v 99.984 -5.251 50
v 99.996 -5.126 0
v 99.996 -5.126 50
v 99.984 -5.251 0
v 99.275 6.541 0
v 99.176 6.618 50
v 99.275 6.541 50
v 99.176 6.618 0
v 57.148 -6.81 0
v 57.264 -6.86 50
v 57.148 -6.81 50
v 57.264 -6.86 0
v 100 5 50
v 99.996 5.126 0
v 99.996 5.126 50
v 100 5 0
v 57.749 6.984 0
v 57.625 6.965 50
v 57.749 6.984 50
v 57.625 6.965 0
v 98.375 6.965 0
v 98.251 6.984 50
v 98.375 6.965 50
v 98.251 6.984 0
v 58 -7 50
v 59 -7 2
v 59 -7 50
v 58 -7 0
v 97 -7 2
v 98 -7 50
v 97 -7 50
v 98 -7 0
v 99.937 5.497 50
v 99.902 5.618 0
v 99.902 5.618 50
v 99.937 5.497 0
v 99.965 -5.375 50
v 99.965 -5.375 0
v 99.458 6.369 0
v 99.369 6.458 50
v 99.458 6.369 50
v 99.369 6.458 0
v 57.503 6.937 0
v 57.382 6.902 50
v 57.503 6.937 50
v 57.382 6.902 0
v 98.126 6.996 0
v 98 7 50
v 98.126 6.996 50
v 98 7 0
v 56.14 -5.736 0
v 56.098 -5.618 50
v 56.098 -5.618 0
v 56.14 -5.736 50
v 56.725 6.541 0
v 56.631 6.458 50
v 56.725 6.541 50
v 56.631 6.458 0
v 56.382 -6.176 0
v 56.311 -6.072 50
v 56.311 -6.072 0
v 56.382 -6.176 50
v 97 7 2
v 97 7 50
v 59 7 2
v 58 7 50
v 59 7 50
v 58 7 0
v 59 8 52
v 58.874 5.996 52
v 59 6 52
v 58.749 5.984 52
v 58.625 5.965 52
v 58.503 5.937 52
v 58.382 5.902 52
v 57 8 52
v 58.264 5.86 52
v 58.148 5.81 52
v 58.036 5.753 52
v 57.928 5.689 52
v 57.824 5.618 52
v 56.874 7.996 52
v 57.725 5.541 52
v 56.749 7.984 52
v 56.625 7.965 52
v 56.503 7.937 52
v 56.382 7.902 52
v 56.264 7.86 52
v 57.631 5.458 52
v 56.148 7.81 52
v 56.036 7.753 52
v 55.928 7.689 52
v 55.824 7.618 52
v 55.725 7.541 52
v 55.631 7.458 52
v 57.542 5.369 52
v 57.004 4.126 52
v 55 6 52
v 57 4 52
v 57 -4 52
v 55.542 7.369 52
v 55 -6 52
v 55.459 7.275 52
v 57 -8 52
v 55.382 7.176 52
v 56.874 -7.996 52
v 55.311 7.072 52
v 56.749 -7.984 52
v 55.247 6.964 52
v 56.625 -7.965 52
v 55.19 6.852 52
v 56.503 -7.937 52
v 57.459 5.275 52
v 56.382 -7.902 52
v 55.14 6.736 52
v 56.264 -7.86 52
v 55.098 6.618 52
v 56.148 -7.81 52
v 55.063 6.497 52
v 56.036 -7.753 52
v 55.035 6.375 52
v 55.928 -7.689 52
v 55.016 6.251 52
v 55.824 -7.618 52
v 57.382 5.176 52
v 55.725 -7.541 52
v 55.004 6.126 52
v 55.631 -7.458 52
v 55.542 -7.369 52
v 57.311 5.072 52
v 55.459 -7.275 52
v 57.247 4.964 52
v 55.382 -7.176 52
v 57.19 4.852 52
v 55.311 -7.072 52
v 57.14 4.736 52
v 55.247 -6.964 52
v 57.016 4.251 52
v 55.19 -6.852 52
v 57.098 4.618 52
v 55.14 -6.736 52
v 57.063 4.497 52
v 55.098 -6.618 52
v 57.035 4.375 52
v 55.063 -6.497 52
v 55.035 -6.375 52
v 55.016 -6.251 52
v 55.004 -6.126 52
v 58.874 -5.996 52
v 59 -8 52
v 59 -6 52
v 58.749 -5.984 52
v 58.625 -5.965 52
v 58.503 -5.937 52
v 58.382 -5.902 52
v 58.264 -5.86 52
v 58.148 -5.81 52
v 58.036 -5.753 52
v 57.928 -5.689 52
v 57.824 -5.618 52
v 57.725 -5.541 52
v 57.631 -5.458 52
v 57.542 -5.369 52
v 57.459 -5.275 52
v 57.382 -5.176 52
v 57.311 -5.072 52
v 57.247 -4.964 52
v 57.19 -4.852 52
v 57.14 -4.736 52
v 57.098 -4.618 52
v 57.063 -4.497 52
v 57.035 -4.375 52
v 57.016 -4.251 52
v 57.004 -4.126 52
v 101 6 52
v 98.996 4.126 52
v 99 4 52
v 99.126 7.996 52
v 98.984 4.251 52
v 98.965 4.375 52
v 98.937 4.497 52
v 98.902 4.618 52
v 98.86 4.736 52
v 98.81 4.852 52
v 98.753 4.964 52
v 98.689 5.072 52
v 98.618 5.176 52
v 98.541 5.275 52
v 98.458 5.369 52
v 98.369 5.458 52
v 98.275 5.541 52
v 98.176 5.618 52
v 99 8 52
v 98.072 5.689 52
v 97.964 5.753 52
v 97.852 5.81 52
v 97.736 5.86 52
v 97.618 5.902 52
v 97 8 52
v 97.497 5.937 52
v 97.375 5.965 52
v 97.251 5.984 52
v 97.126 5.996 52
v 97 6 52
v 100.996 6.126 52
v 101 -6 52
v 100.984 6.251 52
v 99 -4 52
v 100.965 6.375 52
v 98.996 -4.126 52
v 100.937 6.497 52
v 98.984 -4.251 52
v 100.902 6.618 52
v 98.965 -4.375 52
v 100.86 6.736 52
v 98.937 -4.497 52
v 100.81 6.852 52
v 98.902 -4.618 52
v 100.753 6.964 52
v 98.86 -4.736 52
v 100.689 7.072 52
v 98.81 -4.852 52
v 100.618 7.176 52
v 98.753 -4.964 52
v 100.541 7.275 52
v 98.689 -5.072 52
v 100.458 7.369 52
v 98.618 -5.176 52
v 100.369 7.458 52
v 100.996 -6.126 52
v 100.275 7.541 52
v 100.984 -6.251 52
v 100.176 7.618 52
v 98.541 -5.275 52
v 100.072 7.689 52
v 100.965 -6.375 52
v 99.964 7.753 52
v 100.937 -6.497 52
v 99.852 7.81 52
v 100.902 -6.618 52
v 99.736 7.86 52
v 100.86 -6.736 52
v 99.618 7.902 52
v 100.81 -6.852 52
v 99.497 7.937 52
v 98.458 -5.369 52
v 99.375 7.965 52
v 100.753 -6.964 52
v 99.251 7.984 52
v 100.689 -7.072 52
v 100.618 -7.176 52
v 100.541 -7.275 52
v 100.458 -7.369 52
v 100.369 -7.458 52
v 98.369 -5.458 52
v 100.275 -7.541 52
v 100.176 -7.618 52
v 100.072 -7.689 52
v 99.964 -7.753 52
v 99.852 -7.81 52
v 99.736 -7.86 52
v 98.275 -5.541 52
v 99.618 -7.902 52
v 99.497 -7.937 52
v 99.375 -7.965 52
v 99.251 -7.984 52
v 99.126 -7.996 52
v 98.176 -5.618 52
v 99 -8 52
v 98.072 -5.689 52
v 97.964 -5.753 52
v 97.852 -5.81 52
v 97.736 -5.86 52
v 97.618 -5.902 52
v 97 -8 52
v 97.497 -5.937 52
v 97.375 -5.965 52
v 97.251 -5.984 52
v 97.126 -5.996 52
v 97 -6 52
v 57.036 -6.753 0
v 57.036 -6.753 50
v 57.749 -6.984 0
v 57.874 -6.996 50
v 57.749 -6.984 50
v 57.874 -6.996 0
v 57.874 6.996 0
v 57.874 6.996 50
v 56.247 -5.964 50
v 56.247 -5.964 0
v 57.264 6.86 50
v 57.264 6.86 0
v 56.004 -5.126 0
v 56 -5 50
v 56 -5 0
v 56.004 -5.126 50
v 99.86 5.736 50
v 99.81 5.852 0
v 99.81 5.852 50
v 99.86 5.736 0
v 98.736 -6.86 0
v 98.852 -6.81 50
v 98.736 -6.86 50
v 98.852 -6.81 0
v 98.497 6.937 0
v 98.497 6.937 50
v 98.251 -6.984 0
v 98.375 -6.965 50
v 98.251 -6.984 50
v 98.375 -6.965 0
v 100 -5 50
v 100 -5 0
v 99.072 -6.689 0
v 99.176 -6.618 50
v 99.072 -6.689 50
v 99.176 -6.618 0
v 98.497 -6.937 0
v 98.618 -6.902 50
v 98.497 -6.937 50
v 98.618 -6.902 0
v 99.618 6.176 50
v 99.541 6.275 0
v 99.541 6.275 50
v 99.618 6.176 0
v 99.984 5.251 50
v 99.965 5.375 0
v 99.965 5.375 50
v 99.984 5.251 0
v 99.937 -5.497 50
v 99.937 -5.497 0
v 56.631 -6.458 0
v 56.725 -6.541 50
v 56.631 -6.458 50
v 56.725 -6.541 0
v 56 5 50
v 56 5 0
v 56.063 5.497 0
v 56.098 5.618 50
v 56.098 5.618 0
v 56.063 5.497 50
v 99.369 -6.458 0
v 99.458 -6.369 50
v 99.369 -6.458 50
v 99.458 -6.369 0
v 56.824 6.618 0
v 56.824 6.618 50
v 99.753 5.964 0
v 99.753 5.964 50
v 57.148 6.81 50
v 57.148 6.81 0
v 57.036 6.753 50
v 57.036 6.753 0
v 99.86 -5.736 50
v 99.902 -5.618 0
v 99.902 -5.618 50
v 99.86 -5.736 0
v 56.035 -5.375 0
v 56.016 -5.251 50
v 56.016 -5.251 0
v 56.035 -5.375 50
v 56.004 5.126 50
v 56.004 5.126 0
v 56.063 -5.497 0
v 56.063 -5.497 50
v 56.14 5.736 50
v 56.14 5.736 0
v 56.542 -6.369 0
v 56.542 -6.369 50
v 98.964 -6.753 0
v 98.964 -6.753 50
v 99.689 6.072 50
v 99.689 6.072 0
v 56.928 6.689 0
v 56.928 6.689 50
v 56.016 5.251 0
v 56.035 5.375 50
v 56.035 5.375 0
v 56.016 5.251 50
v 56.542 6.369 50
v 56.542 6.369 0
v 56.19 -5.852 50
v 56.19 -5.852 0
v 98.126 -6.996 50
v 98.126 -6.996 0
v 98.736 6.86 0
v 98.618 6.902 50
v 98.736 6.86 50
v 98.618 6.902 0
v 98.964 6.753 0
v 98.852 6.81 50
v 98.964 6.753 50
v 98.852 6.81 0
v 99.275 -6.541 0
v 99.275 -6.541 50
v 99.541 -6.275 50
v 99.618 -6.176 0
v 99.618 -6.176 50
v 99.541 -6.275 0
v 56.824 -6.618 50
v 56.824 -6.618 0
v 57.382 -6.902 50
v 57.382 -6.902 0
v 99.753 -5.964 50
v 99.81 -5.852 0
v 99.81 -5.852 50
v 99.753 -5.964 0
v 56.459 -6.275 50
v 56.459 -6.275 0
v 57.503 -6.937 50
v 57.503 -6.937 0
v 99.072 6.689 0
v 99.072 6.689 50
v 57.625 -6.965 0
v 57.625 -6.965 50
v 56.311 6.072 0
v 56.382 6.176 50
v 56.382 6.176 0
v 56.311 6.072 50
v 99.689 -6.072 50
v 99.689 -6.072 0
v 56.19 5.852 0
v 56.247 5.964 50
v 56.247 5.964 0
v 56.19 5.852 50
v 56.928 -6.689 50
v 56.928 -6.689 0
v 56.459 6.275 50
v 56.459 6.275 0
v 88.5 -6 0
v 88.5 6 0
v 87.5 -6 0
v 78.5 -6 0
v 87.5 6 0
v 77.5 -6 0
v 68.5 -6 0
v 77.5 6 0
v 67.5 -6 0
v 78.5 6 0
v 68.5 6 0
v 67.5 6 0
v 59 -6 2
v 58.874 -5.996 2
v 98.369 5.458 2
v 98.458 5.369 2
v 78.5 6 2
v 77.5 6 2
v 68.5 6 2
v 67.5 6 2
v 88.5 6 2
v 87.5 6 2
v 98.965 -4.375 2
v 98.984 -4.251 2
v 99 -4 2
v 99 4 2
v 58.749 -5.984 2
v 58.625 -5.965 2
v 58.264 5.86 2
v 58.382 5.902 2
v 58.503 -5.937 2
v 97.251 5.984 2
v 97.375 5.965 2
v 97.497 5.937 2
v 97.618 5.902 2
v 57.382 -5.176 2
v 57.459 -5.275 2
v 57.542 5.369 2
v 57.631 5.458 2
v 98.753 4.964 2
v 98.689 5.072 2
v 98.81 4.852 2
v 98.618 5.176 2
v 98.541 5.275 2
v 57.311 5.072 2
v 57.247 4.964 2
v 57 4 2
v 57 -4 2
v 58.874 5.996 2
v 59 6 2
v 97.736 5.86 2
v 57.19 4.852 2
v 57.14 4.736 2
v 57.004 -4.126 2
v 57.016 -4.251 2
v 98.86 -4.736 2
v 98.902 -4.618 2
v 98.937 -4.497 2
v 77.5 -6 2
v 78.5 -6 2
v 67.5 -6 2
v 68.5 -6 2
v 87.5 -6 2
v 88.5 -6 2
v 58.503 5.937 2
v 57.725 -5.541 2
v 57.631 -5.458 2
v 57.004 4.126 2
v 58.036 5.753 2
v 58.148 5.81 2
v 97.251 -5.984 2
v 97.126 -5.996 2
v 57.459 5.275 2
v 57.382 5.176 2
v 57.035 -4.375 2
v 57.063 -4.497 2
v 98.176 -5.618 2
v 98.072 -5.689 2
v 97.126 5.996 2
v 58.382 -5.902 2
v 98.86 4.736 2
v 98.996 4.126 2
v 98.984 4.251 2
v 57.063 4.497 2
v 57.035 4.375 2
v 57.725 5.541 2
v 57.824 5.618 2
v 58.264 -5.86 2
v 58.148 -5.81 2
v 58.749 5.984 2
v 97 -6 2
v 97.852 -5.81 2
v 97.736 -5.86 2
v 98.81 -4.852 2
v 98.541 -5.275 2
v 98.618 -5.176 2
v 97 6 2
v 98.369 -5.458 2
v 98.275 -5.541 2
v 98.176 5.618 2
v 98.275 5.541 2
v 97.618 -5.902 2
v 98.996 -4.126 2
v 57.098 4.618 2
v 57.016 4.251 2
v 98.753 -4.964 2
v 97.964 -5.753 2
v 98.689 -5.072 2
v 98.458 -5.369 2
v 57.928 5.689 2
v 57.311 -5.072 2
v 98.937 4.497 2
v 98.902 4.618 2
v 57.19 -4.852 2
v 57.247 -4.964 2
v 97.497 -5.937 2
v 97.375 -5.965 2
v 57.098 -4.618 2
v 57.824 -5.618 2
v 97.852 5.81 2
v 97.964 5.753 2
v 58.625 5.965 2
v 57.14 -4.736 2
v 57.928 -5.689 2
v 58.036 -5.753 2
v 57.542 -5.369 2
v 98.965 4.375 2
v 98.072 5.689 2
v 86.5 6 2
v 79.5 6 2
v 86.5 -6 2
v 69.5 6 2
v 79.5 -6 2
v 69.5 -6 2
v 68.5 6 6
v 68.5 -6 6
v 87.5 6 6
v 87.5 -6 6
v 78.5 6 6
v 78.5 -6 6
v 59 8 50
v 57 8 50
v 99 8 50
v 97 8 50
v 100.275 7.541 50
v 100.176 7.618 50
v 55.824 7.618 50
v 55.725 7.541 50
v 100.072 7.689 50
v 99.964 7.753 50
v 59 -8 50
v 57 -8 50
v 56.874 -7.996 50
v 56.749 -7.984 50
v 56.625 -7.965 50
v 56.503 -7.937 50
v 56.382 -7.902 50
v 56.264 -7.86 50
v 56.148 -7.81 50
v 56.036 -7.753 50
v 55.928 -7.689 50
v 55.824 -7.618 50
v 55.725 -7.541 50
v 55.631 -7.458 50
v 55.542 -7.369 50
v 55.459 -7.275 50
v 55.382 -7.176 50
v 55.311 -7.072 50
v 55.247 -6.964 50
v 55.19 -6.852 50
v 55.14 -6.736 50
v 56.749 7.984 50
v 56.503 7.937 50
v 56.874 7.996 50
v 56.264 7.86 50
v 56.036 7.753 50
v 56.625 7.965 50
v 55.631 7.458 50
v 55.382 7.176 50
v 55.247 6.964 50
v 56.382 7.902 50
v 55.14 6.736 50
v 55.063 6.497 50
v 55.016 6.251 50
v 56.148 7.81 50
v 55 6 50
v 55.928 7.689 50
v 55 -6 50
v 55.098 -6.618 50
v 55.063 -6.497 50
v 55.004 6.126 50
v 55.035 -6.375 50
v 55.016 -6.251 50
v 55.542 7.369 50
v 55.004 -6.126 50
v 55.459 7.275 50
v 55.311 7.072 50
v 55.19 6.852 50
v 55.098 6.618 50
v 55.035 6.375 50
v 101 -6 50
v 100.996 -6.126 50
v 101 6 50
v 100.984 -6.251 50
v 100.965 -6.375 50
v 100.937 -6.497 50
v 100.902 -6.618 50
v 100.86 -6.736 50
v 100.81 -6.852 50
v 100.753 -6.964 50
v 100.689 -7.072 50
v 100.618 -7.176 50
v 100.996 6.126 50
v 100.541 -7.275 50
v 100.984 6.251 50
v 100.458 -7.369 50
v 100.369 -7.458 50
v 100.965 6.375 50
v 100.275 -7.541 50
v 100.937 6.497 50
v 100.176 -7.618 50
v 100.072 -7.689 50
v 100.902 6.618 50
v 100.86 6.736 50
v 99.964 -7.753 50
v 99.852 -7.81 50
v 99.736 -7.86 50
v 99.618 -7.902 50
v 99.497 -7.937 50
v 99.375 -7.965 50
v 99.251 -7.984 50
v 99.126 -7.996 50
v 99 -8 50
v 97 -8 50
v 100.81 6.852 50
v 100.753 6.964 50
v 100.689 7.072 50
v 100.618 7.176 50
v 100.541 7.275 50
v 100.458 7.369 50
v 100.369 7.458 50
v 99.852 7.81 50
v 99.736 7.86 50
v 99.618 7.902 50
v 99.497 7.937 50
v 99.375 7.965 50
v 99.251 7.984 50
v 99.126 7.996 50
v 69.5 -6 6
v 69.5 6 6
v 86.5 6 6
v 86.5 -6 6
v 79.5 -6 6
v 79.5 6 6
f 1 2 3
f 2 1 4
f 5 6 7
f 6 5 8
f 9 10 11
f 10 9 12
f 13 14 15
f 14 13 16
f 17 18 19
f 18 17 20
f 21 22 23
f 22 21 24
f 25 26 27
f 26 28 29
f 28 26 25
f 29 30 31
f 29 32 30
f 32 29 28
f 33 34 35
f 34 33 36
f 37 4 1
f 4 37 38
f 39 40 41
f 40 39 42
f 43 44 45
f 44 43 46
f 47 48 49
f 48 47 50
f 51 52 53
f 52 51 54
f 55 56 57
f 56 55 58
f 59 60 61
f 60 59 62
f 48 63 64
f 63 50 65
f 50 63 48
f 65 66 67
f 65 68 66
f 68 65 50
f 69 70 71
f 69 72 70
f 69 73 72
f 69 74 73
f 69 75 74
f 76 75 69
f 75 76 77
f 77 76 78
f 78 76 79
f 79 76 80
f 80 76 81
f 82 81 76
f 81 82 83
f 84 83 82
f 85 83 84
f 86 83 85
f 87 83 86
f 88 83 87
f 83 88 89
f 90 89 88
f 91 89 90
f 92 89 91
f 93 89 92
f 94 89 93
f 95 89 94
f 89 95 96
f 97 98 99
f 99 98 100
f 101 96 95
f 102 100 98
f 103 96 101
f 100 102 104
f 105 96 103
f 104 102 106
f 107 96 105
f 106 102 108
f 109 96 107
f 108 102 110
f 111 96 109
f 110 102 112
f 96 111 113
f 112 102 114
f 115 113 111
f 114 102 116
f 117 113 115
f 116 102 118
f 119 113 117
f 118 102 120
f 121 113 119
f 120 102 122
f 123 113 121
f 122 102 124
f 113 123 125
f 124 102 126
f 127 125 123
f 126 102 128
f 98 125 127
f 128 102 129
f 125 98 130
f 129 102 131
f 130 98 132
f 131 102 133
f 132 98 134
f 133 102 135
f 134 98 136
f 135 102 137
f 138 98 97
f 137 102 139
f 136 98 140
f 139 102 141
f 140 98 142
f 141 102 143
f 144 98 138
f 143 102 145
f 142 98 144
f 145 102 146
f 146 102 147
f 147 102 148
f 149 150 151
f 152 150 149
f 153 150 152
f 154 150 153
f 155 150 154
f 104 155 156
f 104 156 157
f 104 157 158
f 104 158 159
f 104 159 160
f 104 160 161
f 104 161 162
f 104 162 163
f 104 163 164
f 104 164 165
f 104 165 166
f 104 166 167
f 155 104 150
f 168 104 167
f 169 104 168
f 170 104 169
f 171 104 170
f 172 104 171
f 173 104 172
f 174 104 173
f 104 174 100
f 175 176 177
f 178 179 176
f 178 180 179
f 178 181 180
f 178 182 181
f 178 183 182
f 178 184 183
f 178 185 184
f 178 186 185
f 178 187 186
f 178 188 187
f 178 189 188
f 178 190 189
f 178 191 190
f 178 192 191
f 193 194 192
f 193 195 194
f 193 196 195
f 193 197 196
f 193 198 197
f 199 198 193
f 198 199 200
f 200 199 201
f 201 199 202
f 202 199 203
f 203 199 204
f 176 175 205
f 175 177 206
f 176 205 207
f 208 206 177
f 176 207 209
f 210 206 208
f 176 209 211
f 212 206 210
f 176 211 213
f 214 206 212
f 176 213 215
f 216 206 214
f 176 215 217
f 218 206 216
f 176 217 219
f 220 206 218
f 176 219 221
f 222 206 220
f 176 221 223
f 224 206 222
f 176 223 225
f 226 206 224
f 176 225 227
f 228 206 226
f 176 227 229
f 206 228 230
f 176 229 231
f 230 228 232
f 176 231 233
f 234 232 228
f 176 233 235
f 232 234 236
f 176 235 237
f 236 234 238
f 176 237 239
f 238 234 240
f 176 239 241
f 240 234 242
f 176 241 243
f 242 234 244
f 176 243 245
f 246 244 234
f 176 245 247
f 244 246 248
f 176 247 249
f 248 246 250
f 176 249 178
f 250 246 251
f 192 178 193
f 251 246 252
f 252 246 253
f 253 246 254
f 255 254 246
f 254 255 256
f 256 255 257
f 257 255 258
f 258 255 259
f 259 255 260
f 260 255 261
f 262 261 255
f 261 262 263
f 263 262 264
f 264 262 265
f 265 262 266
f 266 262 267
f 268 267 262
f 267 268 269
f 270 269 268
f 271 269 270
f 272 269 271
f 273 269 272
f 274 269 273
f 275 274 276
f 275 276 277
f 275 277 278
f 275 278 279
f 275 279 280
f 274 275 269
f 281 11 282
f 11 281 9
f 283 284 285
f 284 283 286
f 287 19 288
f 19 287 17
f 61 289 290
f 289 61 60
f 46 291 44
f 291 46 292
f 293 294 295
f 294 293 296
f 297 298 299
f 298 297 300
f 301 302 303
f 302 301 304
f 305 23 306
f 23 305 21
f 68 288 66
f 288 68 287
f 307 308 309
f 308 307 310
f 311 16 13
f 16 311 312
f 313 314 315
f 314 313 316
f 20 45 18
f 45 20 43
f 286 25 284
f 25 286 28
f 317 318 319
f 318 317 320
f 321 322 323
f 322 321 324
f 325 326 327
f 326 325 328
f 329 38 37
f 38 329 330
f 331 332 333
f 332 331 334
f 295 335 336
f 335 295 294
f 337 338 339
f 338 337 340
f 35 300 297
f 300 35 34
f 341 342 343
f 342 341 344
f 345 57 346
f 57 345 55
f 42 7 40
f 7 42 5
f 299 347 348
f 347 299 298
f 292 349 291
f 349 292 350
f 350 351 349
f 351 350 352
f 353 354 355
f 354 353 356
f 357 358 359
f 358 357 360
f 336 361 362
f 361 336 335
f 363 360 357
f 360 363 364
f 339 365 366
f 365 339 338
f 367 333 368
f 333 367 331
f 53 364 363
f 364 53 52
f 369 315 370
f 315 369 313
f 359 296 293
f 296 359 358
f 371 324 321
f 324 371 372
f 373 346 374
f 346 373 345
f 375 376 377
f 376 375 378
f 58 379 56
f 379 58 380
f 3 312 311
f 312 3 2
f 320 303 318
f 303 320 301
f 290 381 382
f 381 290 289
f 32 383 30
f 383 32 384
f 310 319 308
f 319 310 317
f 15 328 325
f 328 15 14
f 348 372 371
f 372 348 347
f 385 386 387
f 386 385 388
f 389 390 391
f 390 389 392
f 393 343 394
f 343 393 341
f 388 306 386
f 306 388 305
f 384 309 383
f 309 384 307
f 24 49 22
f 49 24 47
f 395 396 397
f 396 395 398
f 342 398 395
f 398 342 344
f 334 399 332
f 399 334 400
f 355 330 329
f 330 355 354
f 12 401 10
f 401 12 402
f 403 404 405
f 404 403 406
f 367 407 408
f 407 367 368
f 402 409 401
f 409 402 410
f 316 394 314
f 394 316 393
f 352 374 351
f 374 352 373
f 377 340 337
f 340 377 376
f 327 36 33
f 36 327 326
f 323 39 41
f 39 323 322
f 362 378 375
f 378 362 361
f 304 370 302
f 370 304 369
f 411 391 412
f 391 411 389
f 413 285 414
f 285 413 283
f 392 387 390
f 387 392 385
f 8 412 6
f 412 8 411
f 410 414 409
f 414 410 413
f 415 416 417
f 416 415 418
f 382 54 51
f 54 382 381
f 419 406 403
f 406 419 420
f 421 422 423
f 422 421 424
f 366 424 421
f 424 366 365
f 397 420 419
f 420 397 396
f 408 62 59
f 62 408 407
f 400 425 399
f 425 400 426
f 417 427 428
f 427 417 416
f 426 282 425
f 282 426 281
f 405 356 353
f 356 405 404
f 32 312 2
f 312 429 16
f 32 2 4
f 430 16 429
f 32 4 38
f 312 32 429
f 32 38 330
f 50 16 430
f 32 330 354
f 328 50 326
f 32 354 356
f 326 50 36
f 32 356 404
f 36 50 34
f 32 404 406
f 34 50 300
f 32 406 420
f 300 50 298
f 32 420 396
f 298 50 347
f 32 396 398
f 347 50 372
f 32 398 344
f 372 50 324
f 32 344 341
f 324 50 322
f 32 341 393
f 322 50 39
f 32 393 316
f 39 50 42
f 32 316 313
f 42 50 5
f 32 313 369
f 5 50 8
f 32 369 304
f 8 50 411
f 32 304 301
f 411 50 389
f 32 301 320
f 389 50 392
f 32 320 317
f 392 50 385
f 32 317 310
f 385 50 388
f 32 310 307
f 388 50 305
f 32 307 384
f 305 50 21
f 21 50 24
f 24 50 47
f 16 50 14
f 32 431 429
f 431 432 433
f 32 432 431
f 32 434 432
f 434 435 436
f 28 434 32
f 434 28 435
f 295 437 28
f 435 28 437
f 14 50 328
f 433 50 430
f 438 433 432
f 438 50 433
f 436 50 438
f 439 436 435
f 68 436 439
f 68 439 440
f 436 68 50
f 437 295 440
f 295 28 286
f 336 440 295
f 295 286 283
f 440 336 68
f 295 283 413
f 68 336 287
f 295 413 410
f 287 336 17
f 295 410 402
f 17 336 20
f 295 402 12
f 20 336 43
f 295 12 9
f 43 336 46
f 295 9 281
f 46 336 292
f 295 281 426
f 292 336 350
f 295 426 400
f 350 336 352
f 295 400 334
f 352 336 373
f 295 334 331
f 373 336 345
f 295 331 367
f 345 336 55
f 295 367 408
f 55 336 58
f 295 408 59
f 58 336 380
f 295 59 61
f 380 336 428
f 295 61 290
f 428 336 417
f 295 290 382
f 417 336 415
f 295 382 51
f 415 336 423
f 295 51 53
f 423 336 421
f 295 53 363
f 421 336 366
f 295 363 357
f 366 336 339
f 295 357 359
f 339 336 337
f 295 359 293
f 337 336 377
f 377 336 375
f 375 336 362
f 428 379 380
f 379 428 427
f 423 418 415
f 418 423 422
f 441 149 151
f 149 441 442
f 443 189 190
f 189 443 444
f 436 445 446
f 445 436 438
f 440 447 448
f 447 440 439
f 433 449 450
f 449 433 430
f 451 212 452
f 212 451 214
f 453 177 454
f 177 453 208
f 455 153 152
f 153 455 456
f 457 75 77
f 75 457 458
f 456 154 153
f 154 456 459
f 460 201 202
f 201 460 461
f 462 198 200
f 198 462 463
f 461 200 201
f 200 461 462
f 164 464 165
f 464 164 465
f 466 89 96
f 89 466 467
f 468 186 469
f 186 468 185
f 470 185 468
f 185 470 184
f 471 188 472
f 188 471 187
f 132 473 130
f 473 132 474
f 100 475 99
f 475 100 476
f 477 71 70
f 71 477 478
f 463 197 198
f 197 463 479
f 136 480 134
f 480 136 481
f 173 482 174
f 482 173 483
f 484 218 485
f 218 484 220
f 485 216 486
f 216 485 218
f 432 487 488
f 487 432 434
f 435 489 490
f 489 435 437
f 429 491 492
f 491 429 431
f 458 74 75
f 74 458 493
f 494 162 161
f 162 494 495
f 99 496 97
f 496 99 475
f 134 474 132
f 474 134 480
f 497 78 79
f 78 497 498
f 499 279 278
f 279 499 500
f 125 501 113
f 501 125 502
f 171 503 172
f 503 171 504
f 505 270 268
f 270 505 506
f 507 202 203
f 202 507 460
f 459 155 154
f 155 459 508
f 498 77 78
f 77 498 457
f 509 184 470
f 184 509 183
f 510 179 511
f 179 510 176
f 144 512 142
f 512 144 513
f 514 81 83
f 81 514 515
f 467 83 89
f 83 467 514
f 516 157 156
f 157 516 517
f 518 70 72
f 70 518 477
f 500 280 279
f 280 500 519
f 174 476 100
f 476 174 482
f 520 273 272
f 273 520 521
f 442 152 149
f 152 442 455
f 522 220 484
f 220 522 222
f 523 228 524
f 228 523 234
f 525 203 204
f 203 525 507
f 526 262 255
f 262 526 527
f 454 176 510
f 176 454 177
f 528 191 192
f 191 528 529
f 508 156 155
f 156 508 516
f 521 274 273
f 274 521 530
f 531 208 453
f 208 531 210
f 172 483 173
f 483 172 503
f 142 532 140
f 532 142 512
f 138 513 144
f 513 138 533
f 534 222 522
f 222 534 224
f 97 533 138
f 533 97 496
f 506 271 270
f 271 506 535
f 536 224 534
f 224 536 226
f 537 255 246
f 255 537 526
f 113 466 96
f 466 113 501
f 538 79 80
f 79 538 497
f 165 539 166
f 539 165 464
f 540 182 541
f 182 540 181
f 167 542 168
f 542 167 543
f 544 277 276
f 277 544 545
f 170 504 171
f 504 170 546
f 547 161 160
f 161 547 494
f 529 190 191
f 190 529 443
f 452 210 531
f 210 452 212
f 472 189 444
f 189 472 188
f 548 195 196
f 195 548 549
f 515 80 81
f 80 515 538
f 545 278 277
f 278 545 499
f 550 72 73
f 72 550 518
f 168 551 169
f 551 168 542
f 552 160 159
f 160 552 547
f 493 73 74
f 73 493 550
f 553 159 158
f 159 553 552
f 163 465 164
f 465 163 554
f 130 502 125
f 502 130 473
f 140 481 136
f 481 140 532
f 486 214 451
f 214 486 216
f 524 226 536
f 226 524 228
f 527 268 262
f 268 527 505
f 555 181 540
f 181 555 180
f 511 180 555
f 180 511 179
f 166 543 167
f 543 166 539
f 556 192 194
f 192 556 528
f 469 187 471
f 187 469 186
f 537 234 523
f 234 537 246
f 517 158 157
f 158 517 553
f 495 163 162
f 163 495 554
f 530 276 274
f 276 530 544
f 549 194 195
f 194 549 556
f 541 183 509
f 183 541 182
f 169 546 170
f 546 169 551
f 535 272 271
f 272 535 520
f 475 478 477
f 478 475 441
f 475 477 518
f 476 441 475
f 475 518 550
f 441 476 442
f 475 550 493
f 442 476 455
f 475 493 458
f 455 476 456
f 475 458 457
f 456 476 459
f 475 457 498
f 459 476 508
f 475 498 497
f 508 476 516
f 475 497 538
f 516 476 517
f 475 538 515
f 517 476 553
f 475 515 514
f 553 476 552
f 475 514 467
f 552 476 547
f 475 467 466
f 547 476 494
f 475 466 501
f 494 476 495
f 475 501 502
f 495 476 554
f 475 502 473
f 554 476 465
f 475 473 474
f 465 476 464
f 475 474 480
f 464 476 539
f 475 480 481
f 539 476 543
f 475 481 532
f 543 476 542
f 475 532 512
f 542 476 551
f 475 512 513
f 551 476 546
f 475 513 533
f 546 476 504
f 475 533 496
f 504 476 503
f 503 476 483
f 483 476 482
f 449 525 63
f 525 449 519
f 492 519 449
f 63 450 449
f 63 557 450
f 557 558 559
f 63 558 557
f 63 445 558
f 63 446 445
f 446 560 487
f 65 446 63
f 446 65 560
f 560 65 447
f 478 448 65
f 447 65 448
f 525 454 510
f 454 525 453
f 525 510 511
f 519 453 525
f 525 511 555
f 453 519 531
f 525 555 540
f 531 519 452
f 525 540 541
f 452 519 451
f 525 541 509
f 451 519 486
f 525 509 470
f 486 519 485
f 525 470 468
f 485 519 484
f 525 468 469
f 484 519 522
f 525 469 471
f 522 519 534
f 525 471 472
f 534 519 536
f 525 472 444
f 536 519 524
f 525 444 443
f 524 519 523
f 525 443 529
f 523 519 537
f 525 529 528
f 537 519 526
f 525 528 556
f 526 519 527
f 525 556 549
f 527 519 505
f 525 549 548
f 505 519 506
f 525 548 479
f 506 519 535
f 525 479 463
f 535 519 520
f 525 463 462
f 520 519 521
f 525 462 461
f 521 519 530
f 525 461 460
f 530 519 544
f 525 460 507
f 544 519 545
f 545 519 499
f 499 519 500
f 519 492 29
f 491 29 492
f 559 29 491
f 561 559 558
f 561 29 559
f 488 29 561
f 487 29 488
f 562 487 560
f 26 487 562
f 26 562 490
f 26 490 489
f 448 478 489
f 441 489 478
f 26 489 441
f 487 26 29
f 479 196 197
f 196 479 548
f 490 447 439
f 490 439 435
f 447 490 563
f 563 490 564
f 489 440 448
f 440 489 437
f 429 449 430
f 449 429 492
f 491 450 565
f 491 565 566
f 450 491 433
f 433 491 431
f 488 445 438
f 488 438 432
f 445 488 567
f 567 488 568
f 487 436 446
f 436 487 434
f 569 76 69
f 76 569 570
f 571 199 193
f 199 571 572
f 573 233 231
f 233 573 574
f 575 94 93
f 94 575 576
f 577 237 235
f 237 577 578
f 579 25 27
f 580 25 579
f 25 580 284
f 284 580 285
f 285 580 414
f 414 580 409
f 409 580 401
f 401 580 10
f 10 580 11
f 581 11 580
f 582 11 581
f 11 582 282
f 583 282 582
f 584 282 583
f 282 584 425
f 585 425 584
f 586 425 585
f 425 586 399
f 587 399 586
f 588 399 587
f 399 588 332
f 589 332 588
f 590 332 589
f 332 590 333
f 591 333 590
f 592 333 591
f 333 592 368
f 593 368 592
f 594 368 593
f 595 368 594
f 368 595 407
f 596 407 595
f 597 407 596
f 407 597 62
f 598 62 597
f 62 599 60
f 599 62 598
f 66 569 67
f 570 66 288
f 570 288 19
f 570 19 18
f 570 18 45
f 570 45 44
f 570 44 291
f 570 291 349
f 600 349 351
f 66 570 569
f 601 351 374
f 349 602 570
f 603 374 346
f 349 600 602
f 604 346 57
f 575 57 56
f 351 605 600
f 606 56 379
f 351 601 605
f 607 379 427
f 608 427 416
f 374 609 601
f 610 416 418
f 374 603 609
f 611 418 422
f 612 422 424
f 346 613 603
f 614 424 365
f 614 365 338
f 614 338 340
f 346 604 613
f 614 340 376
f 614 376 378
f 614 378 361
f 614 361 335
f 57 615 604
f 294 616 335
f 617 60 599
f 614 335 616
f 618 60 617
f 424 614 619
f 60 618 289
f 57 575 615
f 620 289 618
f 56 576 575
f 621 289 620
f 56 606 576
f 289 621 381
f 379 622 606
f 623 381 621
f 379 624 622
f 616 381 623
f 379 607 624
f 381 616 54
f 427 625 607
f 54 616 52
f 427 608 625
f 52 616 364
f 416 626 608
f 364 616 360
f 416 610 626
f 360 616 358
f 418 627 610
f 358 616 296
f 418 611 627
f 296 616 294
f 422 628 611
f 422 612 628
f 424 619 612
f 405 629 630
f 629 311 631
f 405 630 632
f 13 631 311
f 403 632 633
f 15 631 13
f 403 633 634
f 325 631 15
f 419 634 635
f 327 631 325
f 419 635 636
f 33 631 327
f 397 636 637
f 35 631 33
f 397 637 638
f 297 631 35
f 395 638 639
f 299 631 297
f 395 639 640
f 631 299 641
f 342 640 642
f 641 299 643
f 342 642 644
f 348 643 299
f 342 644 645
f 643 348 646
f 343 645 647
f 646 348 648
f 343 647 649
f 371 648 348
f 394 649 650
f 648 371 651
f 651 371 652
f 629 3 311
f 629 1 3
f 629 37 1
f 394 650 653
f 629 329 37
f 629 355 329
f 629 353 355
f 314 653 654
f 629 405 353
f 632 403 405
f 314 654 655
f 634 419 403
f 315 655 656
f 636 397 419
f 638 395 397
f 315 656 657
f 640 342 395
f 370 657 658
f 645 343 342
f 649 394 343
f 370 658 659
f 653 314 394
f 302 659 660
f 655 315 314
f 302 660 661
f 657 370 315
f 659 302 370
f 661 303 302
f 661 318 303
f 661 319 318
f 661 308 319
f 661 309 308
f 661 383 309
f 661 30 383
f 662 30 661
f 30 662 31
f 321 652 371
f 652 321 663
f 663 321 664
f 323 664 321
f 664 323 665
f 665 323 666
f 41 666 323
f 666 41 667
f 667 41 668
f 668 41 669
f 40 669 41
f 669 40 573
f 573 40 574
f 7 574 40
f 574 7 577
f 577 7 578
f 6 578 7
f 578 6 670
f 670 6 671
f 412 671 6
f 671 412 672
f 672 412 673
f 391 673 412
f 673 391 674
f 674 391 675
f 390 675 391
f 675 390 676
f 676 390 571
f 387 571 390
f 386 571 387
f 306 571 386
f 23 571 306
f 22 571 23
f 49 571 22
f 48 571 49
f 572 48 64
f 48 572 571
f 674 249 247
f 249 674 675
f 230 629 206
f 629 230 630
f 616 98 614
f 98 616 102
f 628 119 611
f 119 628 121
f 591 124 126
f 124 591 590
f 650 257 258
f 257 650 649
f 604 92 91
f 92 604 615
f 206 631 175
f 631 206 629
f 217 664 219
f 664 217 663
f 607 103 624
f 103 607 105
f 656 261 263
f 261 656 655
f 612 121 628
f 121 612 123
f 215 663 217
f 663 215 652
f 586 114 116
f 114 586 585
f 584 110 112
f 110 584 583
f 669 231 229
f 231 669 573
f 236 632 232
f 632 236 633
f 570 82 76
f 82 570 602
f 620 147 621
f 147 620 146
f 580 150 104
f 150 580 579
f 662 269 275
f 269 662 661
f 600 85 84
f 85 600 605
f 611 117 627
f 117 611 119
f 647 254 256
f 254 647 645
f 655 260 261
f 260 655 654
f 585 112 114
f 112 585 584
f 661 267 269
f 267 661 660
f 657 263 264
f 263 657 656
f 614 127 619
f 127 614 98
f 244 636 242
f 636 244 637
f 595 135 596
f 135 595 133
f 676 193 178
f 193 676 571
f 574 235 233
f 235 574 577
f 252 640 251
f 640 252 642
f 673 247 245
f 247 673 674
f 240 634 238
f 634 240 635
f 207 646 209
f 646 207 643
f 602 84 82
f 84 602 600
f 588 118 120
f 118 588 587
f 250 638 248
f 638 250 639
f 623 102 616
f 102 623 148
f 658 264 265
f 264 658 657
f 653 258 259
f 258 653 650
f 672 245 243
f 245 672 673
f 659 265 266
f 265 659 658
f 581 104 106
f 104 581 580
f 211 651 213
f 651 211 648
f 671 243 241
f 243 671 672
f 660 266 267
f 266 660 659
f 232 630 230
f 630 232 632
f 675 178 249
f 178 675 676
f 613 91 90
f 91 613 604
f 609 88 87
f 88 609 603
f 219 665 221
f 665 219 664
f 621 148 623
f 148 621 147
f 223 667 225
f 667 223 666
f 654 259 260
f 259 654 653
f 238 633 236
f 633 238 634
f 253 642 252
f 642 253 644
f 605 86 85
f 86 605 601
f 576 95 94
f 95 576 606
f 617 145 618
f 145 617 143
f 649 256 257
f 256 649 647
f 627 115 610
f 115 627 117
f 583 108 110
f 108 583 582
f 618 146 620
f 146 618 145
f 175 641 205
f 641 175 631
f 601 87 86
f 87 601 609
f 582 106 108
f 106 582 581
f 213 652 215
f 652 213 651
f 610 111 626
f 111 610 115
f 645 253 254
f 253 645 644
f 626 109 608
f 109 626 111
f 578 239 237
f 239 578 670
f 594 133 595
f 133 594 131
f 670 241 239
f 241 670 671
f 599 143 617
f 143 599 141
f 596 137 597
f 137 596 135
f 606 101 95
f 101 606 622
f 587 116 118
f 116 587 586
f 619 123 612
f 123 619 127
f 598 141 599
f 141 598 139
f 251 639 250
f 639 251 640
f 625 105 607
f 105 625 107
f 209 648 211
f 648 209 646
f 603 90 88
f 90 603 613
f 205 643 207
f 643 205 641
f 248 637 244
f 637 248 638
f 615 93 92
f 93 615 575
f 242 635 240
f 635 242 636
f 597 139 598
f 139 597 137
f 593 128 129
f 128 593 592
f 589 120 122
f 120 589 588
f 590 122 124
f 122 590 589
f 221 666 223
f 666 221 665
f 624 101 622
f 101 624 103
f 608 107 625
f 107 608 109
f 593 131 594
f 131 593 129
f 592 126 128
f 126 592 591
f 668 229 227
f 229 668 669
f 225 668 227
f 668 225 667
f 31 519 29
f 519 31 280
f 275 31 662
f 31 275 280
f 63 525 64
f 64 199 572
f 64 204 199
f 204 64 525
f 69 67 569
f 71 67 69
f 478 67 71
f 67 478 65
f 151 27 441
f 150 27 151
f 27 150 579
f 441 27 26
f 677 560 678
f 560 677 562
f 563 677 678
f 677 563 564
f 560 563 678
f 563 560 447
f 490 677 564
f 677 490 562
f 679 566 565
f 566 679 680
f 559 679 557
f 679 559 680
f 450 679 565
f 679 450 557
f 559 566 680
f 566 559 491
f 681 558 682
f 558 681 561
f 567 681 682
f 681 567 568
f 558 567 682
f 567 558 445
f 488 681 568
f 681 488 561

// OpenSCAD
r = 78/2; // outer radius of beaker
t = 2;
c = 10; // clamp height
d = 10; // drop
bt = 5.8; // beaker thickness

ph_meter_radius = 29/2;

holder_width = 22;
holder_height = 50;
holder_depth = 7;

$fn=100;

// inner();
// clamps();
translate([r*2, 0]) holder();

module clamps() {
    difference(){
        cylinder(c, r=r + t);
        cylinder(c, r=r);
        cube([r*3, r*0.85, c*2], center = true);
        cube([r*0.85, r*3, c*2], center = true);
    }
}

module inner() {
    w1 = holder_height;
    w2 = holder_width;
    h2 = holder_depth;
    h1 = 4;
    
    tolerance = 0.6;
    corner_radius = 2;
   
    difference() {
        union() {
            cylinder(t, r=r);
            cylinder(t+d, r=r-bt);
        }
        translate([0, 15]) cylinder(t+d, r=ph_meter_radius);
        translate([0, -14]) hull() standoffs(t+d, w2+tolerance, h2+tolerance, corner_radius);
    }
}



module standoffs(h, w, d, r) {
    translate([w-r, d-r]) cylinder(h, r, r);
    translate([w-r, -d+r]) cylinder(h, r, r);
    translate([-w+r, d-r]) cylinder(h, r, r);
    translate([-w+r, -d+r]) cylinder(h, r, r);
}

module holder() {
    w1 = holder_height;
    w2 = holder_width;
    h2 = holder_depth;
    wire_radius = 1.8/2;
    
    ew = 12; // electrode width
    ed = 1; // electrode thickness
    d = 20; // distance apart
    h = holder_height; // height
    
    difference() {
        union() {
            difference() {
                hull() standoffs(t+h, w2, h2, 2);
                translate([0, 0, t]) hull() standoffs(t+h, w2-t/2, h2-t/2, 2);
                translate([-d/2, 0]) cube([ed, ew, t*2], center=true);
                translate([-d/2, 0]) cube([ed, ew, t*2], center=true);
                translate([d/2, 0]) cube([ed, ew, t*2], center=true);
                cube([ed, ew, t*2], center=true);
            }
            translate([0, 0, h]) difference() {
                hull() standoffs(t, w2+1, h2+1, 2);
                hull() standoffs(t, w2, h2, 2);
            }
        }
        translate([0, 0, (h+t)/2 + t]) cube([w2*2 - 4 - t, w2*2, h+t], center=true);
    }
    translate([-d/2 + ed, 0, t*1.5]) cube([ed, ew, t*3], center=true);
    translate([d/2 - ed, 0, t*1.5]) cube([ed, ew, t*3], center=true);
    translate([ed, 0, t*1.5]) cube([ed, ew, t*3], center=true);
    
}
